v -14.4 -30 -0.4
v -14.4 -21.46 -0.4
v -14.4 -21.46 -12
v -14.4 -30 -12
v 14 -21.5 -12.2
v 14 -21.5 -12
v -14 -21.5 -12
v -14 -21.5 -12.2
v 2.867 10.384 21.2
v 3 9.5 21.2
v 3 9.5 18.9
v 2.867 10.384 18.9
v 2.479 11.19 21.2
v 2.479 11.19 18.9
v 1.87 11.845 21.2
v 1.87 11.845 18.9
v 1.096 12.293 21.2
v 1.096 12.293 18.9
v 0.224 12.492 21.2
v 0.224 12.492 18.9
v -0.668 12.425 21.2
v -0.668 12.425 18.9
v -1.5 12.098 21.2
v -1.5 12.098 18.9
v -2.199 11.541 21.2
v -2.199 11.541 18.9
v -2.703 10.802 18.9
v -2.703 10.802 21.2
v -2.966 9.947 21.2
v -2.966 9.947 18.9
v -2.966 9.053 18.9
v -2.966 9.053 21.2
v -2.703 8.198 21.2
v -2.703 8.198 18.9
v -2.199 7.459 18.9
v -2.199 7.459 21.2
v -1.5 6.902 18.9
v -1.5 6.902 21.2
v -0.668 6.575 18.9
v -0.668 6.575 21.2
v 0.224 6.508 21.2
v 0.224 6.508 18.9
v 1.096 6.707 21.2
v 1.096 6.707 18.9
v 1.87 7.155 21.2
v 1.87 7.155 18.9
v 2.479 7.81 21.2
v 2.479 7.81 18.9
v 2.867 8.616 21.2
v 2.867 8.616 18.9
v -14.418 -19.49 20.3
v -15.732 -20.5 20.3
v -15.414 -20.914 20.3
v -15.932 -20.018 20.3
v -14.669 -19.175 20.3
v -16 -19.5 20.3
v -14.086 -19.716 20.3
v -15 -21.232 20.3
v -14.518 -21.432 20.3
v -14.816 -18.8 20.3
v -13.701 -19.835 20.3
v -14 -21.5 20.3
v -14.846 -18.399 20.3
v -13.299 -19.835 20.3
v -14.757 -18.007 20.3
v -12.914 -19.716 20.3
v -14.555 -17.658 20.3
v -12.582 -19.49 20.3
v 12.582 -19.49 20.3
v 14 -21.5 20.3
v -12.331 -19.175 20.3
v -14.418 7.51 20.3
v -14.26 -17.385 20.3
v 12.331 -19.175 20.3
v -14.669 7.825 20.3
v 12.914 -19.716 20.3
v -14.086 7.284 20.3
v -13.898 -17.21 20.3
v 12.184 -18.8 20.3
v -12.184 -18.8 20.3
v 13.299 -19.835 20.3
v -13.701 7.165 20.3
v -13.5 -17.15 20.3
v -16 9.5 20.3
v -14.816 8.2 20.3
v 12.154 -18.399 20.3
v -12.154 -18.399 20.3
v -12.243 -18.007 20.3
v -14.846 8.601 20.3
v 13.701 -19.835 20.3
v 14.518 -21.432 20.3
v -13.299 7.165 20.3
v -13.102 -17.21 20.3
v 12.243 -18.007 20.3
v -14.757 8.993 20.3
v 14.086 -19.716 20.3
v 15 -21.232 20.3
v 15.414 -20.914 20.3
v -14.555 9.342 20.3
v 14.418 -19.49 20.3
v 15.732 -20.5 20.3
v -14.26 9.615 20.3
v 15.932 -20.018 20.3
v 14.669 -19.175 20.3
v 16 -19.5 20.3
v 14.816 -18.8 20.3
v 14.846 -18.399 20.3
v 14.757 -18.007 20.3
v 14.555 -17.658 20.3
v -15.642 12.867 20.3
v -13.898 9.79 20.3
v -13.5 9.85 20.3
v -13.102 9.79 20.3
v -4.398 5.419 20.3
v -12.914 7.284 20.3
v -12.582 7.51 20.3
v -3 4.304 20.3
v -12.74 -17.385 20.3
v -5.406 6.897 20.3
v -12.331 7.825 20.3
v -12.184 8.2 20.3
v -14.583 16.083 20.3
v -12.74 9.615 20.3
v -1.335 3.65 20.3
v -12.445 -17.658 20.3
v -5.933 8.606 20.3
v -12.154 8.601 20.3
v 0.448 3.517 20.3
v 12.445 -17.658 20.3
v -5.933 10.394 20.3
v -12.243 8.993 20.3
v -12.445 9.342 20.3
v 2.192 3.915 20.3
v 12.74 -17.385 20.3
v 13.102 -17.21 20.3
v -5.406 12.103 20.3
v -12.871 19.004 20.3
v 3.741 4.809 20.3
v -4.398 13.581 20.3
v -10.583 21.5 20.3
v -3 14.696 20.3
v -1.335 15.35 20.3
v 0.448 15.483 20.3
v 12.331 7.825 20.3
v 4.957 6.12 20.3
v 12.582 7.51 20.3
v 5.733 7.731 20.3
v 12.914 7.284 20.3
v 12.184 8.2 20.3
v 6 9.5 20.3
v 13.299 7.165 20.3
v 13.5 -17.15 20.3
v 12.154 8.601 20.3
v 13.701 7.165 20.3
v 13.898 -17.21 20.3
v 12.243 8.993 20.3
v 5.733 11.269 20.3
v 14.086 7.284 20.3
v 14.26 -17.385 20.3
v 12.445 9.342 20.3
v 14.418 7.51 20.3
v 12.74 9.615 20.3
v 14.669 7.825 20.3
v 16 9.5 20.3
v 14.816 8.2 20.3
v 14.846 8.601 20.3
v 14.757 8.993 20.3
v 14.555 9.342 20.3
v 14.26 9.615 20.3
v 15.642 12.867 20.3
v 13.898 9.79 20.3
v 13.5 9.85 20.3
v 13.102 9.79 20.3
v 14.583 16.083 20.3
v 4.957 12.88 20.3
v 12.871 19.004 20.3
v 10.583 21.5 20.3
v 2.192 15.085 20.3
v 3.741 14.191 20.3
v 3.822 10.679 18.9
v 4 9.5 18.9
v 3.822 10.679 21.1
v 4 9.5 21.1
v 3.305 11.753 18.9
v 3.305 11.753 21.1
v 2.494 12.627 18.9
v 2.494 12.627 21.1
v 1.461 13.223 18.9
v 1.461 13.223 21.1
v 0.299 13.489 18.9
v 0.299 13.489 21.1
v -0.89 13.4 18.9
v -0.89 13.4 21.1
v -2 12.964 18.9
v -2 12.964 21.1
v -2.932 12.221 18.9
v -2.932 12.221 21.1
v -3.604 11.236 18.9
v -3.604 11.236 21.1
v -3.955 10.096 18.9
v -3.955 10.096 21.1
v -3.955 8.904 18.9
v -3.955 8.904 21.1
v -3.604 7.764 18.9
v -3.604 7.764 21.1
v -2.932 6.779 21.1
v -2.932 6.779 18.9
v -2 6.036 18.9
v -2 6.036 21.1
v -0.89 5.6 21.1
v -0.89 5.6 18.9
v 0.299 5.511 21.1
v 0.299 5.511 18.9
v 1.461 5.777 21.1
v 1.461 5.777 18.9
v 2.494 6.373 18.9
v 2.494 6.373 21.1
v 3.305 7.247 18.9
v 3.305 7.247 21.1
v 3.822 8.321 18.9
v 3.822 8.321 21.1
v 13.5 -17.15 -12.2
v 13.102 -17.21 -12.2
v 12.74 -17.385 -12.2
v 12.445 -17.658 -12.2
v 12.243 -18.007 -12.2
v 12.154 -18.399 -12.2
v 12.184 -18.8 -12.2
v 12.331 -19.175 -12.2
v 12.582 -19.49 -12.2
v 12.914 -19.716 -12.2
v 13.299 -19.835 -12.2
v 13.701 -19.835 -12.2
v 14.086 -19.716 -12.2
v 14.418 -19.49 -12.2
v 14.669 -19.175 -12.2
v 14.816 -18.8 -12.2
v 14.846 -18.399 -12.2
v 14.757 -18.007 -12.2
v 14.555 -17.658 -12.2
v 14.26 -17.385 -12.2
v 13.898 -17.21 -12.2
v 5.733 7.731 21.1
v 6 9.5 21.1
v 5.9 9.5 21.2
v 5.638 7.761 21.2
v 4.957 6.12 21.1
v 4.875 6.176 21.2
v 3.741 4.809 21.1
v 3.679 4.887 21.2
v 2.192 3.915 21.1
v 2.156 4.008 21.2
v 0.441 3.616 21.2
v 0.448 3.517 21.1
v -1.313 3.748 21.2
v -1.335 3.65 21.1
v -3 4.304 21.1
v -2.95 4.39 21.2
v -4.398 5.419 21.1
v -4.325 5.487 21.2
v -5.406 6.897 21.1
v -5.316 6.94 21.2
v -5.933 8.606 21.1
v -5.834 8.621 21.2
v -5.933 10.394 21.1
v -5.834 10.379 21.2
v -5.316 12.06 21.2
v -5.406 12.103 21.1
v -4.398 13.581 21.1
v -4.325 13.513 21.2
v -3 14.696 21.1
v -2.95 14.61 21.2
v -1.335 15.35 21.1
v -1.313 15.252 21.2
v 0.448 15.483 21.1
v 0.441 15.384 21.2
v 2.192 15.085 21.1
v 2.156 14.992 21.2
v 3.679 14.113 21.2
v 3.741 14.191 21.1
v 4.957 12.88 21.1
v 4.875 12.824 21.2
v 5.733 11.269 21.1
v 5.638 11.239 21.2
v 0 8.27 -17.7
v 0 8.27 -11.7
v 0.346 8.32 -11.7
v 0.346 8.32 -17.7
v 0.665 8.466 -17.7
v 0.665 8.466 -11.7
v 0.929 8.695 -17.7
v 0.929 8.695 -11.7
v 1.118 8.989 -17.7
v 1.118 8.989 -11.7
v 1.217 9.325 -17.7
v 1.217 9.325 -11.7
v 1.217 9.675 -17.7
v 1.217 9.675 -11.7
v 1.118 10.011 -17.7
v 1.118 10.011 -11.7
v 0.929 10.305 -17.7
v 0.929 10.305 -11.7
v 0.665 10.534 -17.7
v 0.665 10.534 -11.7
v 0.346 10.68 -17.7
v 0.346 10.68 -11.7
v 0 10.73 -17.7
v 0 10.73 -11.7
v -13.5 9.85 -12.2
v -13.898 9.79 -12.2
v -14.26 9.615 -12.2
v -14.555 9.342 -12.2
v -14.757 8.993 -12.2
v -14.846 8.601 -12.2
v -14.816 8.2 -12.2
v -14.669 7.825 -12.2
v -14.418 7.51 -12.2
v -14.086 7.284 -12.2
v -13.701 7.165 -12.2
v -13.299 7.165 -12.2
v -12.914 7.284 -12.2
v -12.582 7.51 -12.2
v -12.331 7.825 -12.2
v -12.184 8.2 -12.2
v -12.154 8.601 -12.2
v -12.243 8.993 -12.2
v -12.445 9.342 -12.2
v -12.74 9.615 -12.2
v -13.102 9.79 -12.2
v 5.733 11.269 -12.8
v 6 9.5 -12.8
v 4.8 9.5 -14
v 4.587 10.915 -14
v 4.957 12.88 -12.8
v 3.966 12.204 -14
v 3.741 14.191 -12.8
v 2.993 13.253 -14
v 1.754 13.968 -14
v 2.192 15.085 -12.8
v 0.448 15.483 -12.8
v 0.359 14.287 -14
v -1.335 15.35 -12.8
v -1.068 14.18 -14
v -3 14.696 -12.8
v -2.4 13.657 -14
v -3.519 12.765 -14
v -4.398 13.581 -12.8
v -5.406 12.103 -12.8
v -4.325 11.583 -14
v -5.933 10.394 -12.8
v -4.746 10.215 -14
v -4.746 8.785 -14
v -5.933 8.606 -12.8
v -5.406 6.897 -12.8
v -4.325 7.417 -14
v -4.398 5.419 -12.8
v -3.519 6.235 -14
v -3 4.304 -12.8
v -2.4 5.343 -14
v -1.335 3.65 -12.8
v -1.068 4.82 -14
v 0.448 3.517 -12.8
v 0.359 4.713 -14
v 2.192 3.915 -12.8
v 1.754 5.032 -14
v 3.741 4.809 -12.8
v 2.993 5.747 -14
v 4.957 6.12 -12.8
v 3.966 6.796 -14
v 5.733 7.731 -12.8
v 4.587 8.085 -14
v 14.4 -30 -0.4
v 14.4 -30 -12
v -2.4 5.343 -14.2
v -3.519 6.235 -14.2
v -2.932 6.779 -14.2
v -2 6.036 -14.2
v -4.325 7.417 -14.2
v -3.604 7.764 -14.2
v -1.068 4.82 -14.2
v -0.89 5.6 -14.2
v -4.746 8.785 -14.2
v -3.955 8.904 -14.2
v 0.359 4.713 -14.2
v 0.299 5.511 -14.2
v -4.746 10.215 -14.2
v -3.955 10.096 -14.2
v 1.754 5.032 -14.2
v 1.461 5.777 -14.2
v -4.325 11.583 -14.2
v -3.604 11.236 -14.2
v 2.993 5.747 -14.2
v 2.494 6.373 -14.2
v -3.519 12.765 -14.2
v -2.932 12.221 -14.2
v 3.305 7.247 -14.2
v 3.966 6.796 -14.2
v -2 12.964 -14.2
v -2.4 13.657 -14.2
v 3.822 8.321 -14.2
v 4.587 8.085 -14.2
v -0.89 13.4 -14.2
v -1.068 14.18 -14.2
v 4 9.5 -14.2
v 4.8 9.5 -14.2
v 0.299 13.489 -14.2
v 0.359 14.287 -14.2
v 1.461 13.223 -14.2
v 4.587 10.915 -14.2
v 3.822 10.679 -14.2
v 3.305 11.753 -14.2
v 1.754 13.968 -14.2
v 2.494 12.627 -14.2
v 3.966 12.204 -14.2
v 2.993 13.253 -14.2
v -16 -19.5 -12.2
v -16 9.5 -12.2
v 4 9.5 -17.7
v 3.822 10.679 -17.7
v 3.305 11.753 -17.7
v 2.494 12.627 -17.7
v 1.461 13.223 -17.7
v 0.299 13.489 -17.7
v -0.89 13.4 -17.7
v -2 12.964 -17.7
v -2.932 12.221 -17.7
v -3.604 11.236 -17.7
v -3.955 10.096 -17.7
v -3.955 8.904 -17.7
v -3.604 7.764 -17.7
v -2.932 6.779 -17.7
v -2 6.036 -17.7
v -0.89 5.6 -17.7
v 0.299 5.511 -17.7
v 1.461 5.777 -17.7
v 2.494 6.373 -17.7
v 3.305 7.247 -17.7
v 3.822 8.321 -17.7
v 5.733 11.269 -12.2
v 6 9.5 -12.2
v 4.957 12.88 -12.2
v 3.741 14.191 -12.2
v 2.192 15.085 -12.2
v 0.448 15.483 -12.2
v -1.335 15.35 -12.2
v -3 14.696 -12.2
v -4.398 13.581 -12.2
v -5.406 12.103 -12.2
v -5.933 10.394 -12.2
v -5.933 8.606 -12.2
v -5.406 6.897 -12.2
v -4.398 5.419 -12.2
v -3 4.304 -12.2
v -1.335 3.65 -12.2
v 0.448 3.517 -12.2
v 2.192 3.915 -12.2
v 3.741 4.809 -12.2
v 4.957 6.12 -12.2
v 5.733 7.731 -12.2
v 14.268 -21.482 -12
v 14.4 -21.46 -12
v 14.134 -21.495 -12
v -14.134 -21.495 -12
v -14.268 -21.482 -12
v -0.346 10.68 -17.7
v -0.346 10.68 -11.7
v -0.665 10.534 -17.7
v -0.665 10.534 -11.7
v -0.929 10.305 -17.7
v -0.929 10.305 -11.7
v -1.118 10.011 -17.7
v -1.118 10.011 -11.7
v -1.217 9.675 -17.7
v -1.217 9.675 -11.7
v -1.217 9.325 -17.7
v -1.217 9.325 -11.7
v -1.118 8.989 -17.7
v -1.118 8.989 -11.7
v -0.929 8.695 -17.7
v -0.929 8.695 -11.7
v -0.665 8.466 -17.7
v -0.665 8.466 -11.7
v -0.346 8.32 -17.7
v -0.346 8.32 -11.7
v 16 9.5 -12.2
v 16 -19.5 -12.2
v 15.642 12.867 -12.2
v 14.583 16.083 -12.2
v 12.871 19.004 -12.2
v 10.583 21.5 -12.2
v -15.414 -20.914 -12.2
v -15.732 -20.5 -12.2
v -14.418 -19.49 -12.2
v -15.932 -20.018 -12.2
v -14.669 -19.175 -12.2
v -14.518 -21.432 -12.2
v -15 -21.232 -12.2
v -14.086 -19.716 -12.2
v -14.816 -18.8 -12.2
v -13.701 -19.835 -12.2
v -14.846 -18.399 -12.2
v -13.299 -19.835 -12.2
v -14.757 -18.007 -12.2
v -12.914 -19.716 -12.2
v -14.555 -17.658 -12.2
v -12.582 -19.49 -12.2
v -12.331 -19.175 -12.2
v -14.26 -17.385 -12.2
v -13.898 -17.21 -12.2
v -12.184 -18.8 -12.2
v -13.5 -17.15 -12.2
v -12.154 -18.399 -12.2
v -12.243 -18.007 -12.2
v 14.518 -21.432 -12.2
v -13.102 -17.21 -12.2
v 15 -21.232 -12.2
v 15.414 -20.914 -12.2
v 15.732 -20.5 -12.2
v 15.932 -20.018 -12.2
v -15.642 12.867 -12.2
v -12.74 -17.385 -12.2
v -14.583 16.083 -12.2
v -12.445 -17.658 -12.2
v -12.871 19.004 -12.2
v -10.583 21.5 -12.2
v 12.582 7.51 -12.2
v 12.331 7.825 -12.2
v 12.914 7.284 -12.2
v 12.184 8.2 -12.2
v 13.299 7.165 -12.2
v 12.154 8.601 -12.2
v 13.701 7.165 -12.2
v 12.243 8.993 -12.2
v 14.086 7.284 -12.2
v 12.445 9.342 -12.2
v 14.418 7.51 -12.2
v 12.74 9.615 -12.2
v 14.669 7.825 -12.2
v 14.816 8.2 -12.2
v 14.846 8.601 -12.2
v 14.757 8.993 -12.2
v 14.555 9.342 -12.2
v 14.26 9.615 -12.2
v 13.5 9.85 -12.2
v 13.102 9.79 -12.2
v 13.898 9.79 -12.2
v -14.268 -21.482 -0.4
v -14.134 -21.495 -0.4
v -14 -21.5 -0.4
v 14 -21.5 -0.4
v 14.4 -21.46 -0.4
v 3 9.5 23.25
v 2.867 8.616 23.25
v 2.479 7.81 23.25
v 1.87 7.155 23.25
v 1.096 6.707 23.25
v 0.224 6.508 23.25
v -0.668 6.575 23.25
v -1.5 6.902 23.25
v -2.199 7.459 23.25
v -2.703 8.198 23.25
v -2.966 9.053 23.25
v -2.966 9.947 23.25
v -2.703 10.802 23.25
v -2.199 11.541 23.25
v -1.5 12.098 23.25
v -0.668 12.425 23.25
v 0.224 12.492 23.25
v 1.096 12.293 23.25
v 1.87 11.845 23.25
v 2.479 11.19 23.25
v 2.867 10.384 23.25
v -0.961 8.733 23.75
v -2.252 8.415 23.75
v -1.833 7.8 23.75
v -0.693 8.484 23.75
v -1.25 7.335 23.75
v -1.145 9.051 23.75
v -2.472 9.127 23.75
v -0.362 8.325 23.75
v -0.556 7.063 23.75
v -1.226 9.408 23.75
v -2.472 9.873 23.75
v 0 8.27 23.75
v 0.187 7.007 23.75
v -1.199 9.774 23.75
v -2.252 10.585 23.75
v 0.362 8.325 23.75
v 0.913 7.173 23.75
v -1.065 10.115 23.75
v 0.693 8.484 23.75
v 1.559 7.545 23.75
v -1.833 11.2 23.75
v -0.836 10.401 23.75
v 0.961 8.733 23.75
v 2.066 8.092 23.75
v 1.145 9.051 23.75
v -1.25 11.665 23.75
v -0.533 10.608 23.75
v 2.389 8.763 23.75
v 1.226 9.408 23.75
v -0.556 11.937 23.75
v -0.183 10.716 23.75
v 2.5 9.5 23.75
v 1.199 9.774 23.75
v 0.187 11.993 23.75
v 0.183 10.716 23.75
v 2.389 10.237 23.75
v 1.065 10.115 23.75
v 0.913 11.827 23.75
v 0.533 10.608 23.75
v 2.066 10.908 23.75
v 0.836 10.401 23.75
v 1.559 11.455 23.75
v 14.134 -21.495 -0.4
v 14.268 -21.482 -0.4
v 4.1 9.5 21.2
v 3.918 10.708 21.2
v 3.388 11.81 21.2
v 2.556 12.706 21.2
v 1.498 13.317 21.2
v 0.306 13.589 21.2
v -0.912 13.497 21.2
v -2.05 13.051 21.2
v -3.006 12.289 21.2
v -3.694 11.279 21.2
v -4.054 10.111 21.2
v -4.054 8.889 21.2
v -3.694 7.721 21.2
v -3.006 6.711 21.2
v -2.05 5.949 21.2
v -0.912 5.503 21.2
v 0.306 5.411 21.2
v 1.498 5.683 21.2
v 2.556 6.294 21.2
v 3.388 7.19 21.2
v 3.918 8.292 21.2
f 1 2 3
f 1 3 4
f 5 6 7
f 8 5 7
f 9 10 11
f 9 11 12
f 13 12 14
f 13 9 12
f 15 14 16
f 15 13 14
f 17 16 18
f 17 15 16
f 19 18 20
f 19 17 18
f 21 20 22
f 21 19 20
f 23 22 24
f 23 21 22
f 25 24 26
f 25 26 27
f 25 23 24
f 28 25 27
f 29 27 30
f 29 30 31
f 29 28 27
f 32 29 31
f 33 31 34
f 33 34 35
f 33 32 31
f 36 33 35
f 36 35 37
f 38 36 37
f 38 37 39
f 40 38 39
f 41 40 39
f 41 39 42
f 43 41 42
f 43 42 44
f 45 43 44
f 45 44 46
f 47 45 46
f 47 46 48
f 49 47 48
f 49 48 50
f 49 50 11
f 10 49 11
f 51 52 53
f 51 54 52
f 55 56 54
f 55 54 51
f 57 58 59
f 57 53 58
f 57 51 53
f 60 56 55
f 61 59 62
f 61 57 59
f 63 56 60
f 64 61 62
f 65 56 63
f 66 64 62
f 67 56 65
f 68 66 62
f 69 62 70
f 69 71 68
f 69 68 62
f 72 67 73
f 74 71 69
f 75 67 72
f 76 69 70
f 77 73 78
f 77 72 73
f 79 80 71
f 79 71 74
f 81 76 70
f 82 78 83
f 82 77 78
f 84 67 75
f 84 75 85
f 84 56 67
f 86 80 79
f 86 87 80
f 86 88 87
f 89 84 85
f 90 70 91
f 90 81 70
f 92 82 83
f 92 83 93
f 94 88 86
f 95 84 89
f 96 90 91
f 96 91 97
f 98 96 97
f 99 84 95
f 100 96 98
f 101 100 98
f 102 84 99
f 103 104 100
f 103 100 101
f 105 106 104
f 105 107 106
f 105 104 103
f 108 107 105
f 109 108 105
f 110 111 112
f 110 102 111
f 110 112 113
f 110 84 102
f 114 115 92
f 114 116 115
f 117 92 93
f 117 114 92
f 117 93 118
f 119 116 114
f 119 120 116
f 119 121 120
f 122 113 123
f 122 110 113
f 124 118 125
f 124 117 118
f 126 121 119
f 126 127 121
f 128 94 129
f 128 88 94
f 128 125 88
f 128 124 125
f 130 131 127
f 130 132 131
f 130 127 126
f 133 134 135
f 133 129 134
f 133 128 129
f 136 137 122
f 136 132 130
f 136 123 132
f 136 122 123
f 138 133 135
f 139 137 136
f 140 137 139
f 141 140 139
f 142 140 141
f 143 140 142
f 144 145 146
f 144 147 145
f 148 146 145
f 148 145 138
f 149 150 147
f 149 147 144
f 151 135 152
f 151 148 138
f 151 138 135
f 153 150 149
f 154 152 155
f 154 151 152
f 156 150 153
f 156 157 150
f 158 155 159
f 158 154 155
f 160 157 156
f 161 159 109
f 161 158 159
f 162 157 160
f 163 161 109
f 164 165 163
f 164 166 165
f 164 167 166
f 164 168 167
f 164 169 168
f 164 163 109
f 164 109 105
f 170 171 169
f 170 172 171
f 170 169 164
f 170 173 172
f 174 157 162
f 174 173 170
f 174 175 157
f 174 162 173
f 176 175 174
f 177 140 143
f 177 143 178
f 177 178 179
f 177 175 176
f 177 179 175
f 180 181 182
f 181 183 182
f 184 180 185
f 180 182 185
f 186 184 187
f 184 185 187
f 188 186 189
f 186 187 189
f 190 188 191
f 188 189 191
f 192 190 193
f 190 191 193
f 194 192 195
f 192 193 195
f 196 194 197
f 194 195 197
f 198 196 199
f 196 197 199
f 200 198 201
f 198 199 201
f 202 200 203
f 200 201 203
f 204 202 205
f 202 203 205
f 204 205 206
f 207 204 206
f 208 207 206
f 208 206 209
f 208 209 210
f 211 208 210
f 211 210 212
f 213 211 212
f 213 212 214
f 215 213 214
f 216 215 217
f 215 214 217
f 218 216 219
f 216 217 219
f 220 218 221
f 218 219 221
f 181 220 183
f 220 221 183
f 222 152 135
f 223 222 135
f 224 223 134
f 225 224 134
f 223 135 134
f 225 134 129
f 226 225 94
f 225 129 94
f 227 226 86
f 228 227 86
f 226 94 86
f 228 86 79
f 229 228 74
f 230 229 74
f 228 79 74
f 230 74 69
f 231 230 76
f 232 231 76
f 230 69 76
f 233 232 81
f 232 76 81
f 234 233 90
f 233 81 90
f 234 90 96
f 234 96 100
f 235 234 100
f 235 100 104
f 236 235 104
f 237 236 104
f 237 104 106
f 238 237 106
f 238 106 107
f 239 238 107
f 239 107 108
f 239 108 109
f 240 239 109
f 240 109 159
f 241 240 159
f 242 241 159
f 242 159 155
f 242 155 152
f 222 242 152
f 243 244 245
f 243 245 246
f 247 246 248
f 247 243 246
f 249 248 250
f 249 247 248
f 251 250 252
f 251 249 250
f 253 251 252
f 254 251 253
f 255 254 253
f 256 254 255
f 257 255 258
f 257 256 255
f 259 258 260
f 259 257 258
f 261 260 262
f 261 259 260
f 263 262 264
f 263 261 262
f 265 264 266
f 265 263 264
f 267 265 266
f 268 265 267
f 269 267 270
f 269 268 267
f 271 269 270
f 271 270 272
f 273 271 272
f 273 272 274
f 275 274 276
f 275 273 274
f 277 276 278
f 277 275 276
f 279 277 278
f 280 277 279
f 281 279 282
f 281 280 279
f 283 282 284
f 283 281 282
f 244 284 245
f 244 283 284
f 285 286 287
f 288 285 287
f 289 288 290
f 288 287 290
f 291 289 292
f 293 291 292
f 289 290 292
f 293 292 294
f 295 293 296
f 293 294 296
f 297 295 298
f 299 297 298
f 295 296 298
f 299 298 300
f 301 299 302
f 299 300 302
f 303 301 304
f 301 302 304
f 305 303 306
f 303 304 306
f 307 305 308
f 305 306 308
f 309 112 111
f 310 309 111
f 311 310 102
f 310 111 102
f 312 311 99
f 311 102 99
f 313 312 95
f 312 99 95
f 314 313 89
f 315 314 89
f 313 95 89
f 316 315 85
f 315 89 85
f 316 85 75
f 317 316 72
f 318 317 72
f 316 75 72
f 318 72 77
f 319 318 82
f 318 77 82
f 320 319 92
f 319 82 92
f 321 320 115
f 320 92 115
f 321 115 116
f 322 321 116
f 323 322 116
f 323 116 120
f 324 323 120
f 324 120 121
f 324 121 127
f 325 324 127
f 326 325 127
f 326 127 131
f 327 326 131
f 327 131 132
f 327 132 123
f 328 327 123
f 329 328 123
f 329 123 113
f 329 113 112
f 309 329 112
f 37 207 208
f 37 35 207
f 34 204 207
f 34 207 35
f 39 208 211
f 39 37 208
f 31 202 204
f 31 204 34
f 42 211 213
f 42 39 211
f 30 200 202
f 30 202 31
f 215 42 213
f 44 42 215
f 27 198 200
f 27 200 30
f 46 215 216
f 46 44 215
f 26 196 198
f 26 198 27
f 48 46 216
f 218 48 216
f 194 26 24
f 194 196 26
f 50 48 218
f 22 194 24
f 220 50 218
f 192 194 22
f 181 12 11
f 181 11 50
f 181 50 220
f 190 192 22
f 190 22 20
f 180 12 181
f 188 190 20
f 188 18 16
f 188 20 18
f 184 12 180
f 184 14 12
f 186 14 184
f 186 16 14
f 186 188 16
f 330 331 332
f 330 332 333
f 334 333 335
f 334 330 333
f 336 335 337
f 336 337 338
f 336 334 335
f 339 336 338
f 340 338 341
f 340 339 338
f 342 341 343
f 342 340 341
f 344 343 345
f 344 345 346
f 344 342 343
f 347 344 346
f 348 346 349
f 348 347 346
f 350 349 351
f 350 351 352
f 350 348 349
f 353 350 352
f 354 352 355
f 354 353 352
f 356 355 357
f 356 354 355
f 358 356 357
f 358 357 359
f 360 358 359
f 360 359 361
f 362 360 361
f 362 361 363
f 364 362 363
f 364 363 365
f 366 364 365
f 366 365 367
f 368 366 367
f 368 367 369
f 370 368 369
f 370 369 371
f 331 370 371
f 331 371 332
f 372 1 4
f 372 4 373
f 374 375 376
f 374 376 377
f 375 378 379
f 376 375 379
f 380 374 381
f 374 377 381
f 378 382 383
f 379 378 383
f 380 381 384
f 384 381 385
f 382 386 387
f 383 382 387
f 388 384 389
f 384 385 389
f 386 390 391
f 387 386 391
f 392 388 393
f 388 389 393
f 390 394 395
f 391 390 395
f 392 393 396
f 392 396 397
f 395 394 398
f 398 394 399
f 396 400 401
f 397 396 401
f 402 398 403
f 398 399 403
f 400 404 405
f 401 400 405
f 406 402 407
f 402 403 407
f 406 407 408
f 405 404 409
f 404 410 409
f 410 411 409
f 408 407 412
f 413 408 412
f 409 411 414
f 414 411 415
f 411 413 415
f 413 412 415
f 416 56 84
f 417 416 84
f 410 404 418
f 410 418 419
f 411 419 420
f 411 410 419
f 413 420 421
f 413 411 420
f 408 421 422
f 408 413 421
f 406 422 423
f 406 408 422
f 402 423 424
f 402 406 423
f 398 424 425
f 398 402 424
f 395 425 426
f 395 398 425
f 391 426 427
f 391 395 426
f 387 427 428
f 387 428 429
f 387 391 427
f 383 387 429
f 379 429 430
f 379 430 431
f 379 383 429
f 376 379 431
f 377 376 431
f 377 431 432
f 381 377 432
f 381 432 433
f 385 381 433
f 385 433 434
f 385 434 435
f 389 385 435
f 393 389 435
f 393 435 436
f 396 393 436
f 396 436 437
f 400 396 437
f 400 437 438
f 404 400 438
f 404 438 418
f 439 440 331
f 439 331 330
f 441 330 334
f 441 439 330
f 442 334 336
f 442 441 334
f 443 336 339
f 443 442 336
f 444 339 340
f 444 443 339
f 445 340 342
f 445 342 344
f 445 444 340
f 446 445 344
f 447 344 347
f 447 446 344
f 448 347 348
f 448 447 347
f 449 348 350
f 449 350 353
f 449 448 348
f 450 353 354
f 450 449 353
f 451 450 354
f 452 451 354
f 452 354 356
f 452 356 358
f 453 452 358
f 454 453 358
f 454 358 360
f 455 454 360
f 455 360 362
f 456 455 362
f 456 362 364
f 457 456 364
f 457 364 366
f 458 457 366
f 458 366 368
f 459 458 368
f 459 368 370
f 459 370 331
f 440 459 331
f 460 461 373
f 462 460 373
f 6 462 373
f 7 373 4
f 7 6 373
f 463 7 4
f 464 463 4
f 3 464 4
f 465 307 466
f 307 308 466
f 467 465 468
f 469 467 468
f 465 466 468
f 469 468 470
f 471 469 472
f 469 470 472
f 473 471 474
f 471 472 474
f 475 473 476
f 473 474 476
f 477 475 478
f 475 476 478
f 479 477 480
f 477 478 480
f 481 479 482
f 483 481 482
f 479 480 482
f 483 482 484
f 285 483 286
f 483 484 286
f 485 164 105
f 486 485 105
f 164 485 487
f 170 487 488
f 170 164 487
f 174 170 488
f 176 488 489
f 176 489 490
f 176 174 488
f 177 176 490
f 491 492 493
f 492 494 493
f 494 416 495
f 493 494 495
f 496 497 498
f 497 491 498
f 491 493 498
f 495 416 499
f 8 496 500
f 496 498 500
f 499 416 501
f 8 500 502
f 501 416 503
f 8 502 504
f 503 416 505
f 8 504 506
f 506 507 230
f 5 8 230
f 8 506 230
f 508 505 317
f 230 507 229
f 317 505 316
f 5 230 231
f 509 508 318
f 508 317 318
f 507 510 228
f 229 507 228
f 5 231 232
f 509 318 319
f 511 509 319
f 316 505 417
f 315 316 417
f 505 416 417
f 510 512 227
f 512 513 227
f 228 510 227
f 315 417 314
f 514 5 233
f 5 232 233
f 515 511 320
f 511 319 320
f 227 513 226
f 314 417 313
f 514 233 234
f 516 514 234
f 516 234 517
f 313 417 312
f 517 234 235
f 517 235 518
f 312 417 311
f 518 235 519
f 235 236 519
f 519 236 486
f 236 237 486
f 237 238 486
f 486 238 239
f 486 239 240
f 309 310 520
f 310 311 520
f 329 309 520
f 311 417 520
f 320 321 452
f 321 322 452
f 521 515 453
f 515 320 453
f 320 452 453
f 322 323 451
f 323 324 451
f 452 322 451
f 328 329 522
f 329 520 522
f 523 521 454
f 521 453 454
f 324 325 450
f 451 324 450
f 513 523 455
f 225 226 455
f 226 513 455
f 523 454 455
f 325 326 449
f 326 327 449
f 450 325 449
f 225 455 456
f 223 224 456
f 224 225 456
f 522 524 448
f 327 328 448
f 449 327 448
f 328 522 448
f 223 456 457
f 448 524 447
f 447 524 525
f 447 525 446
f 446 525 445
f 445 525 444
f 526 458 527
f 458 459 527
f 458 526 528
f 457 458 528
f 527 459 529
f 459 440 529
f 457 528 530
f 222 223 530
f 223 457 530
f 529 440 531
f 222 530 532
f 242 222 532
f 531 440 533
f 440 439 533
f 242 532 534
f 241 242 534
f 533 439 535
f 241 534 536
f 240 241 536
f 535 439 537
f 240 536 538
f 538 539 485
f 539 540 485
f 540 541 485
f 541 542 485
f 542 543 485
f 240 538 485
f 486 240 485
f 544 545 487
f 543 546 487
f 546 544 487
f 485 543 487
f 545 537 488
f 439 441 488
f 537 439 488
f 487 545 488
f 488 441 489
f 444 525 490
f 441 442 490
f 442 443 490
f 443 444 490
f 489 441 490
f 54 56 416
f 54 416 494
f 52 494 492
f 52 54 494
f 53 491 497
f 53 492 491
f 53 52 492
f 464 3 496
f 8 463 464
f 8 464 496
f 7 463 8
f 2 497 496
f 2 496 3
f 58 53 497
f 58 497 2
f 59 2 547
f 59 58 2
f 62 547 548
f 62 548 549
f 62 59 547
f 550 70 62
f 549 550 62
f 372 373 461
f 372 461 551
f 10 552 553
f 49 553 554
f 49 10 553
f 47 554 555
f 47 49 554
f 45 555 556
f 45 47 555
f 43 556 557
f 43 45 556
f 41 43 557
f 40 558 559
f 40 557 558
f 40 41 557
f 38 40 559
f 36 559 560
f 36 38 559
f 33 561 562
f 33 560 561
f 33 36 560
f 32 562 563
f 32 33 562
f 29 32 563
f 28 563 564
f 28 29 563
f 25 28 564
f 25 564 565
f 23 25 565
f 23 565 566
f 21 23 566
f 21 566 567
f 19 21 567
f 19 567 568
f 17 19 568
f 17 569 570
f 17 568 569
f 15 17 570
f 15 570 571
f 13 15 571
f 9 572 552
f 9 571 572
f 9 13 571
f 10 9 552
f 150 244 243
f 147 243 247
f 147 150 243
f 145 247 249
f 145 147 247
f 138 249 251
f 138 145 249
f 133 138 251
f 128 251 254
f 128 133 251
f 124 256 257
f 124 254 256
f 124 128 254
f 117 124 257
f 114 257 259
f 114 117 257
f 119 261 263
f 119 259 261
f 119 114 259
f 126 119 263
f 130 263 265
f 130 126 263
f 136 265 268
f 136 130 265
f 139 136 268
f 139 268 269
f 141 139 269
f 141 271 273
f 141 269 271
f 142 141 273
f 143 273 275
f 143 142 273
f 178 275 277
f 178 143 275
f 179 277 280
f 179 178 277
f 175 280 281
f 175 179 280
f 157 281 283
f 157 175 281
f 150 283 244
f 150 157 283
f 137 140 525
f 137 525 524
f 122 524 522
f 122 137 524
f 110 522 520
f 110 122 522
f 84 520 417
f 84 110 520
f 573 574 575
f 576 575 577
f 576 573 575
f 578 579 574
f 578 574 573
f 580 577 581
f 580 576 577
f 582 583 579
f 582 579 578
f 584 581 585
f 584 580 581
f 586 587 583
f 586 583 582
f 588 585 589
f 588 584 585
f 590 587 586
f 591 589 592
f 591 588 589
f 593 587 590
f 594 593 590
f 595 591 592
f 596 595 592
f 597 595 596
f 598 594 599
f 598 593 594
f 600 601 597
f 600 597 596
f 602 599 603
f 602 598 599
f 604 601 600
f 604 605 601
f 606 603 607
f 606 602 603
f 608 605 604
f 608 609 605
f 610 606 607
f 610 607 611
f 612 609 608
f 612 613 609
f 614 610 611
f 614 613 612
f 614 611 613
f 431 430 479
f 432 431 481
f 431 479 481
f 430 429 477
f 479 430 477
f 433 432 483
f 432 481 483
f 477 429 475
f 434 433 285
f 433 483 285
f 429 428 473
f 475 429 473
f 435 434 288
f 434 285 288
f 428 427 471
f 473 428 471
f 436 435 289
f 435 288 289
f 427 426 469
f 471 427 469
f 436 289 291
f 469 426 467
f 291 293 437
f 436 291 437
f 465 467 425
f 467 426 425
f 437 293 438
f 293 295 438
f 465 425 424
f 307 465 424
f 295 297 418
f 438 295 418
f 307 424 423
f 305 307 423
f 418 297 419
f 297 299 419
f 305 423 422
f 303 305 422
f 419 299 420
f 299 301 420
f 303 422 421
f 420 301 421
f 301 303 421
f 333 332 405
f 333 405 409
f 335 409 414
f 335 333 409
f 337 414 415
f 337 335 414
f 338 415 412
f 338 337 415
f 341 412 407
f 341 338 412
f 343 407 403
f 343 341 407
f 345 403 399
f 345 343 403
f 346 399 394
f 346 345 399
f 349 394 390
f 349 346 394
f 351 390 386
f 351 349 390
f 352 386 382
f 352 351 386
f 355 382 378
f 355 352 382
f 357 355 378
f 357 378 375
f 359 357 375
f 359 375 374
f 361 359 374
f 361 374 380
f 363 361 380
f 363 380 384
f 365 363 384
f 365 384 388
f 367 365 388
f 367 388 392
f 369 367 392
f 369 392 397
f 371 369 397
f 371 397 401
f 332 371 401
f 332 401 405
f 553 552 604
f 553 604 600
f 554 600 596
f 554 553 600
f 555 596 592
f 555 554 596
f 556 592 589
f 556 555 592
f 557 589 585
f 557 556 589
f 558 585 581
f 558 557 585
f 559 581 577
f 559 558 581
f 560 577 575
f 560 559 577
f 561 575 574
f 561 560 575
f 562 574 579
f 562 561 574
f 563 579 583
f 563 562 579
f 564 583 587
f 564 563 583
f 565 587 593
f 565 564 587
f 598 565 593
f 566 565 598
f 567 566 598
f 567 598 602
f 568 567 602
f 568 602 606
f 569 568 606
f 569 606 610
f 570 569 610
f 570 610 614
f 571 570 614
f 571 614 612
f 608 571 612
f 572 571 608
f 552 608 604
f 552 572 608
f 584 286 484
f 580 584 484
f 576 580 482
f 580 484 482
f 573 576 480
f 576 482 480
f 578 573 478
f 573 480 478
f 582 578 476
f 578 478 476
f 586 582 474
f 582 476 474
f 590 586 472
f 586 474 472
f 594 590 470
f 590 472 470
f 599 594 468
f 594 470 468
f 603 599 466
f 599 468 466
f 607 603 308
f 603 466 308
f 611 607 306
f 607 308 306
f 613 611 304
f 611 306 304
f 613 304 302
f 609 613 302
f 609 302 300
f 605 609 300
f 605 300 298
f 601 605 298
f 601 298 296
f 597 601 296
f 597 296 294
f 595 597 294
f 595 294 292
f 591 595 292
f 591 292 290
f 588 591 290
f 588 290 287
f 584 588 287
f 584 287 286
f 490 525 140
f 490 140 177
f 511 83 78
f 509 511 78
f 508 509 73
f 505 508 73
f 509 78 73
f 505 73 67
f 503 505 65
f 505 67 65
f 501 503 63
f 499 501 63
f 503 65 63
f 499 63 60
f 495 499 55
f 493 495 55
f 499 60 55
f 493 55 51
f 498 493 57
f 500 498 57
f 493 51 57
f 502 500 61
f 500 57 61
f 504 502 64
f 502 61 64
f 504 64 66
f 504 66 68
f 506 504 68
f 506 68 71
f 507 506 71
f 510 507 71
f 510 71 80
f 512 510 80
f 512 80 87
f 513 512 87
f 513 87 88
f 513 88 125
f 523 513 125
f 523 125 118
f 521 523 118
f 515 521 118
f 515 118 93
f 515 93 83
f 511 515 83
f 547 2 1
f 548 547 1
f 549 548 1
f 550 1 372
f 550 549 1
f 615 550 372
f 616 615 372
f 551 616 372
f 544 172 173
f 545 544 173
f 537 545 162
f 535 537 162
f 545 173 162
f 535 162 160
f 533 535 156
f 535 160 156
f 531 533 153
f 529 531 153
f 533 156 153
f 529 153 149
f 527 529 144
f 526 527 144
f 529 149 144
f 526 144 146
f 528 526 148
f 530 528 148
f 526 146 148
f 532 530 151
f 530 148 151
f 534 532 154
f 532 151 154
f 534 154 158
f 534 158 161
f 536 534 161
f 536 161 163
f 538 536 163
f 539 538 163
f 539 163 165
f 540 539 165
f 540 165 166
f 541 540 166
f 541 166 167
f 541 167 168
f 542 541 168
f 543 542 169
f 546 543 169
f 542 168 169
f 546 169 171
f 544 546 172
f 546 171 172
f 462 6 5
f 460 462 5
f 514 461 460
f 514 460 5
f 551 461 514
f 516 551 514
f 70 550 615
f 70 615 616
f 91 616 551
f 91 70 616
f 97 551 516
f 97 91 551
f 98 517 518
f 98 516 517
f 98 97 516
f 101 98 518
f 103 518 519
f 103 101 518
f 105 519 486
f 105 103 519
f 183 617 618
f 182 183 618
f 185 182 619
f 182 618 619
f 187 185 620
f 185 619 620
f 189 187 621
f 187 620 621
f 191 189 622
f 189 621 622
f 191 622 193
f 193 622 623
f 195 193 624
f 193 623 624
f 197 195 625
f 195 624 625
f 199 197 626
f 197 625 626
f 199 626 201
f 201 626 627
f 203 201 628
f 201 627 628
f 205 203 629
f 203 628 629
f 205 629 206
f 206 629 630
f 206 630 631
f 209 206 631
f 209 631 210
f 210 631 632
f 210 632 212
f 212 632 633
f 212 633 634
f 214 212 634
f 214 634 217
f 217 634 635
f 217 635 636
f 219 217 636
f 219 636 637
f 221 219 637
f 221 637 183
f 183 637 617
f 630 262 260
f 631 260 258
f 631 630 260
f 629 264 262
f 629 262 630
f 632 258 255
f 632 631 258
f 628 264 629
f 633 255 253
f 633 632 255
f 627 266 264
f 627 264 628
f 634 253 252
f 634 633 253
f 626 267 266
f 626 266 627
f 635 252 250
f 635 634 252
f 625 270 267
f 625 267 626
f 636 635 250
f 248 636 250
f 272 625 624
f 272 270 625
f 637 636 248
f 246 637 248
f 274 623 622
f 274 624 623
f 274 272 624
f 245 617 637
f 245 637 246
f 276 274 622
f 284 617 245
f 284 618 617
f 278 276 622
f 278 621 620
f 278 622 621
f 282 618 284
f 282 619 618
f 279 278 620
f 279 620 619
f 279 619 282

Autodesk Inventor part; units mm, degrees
ref_plane "YZ Plane" through (0, 0, 0) normal (1, 0, 0) x (0, 1, 0)
ref_plane "XZ Plane" through (0, 0, 0) normal (0, 1, 0) x (-1, 0, 0)
ref_plane "XY Plane" through (0, 0, 0) normal (0, 0, 1) x (1, 0, 0)
sketch "スケッチ1" plane through (0, 0, 0) normal (0, 0, 1) x (1, 0, 0)
  line L0 (-16, 21.5) -> (-10.583, 21.5) construction
  line L1 (16, 21.5) -> (16, 9.5) construction
  line L2 (16, -21.5) -> (-16, -21.5)
  line L3 (-16, -21.5) -> (-16, 9.5)
  line L4 (-16, 21.5) -> (16, -21.5) construction
  line L5 (16, 21.5) -> (-16, -21.5) construction
  line L6 (-14.4, -21.5) -> (-14.4, -30)
  line L7 (-14.4, -30) -> (14.4, -30)
  line L8 (0, 21.5) -> (0, -21.5) construction
  line L9 (14.4, -21.5) -> (14.4, -30)
  line L10 (-13.5, 21.5) -> (-13.5, -21.5) construction
  circle A0 centre (0, 9.5) radius 6
  circle A1 centre (0, 9.5) radius 4
  arc A2 (-10.583, 21.5) -> (-16, 9.5) centre (0, 9.5) ccw
  arc A3 (16, 9.5) -> (10.583, 21.5) centre (0, 9.5) ccw
  line L11 (-10.583, 21.5) -> (10.583, 21.5)
  line L12 (-16, 9.5) -> (-16, 21.5) construction
  line L13 (10.583, 21.5) -> (16, 21.5) construction
  line L14 (16, 9.5) -> (16, -21.5)
  circle A4 centre (0, 9.5) radius 3
  circle A5 centre (0, 9.5) radius 4.8
  point P0 (0, 0)
  point P1 (-13.5, 8.5)
  point P2 (-13.5, -18.5)
  point P3 (13.5, 8.5)
  point P4 (13.5, -18.5)
  dimension "d0" = 32
  dimension "d1" = 43
  dimension "d4" = 28.8
  dimension "d5" = 8.5
  dimension "d8" = 27
  dimension "d9" = 8.5
  dimension "d12" = 18.5
  dimension "d13" = 12
  dimension "d14" = 8
  dimension "d15" = 9.5
  dimension "d17" = 16
  dimension "d32" = 13.5
  dimension "d47" = 6
  dimension "d67" = 9.6
extrude "押し出し1" add sketch "スケッチ1" against normal blind 12.2 contours L2 L3 A2 L11 A3 L14 | A0 | A1 | A4 | A5
extrude "押し出し2" add sketch "スケッチ1" against normal blind 12 contours L9 L7 L6 L2
extrude "押し出し3" add sketch "スケッチ1" against normal blind 14 contours A0 | A1 | A4 | A5
extrude "押し出し4" add sketch "スケッチ1" against normal blind 17.7 contours A1 | A4
chamfer "面取り1" distance 1.2 angle 45 1 edges at (-6, 9.5, -14)
sketch "スケッチ2" plane through (0, 9.5, -17.7) normal (0, 0, -1) x (-1, 0, 0)
  circle A0 centre (0, 0) radius 4 projected
  point P0 (0, -9.5)
hole "穴1" at (0, 9.5, -17.7) direction (0, 0, 1) diameter 2.459 depth 6 thread size "M3x0.5" class "6H" standard "ANSI Metric M Profile"
extrude "押し出し5" add sketch "スケッチ1" along normal blind 20.3 contours L2 L3 A2 L11 A3 L14 | A0 | A1 | A4 | A5
hole "穴2" at (-13.5, 8.5, 0) at (-13.5, -18.5, 0) at (13.5, 8.5, 0) at (13.5, -18.5, 0) direction (0, 0, 1) diameter 2.7 end through all both
extrude "押し出し6" cut sketch "スケッチ1" against normal blind 0.4 contours L9 L7 L6 L2
fillet "フィレット1" radius 2 2 edges at (16, -21.5, 4.05) (-16, -21.5, 4.05)
extrude "押し出し7" add sketch "スケッチ1" along normal blind 21.2 contours A0 | A1 | A4 | A5
extrude "押し出し8" add sketch "スケッチ1" along normal blind 23.75 contours A4
sketch "スケッチ3" plane through (0, 9.5, 23.75) normal (0, 0, 1) x (1, 0, 0)
  circle A0 centre (0, 0) radius 1.2295 projected
  point P0 (0, -9.5)
hole "穴3" at (0, 9.5, 23.75) direction (0, 0, -1) diameter 2.459 end through all thread size "M3x0.5" class "6H" standard "ANSI Metric M Profile"
sketch "スケッチ4" plane through (0, 9.5, 21.2) normal (0, 0, 1) x (1, 0, 0)
  circle A0 centre (0, 0) radius 4
  circle A1 centre (0, 0) radius 3
  point P0 (0, -9.5)
extrude "押し出し9" cut sketch "スケッチ4" against normal blind 2.3
chamfer "面取り2" distance 0.5 angle 45 1 edges at (-3, 9.5, 23.75)
extrude "押し出し10" add sketch "スケッチ1" against normal blind 14.2 contours A5
chamfer "面取り4" distance 0.1 angle 45 2 edges at (-4, 9.5, 21.2) (-6, 9.5, 21.2)
properties part number "B3M-SC-1040-A"
